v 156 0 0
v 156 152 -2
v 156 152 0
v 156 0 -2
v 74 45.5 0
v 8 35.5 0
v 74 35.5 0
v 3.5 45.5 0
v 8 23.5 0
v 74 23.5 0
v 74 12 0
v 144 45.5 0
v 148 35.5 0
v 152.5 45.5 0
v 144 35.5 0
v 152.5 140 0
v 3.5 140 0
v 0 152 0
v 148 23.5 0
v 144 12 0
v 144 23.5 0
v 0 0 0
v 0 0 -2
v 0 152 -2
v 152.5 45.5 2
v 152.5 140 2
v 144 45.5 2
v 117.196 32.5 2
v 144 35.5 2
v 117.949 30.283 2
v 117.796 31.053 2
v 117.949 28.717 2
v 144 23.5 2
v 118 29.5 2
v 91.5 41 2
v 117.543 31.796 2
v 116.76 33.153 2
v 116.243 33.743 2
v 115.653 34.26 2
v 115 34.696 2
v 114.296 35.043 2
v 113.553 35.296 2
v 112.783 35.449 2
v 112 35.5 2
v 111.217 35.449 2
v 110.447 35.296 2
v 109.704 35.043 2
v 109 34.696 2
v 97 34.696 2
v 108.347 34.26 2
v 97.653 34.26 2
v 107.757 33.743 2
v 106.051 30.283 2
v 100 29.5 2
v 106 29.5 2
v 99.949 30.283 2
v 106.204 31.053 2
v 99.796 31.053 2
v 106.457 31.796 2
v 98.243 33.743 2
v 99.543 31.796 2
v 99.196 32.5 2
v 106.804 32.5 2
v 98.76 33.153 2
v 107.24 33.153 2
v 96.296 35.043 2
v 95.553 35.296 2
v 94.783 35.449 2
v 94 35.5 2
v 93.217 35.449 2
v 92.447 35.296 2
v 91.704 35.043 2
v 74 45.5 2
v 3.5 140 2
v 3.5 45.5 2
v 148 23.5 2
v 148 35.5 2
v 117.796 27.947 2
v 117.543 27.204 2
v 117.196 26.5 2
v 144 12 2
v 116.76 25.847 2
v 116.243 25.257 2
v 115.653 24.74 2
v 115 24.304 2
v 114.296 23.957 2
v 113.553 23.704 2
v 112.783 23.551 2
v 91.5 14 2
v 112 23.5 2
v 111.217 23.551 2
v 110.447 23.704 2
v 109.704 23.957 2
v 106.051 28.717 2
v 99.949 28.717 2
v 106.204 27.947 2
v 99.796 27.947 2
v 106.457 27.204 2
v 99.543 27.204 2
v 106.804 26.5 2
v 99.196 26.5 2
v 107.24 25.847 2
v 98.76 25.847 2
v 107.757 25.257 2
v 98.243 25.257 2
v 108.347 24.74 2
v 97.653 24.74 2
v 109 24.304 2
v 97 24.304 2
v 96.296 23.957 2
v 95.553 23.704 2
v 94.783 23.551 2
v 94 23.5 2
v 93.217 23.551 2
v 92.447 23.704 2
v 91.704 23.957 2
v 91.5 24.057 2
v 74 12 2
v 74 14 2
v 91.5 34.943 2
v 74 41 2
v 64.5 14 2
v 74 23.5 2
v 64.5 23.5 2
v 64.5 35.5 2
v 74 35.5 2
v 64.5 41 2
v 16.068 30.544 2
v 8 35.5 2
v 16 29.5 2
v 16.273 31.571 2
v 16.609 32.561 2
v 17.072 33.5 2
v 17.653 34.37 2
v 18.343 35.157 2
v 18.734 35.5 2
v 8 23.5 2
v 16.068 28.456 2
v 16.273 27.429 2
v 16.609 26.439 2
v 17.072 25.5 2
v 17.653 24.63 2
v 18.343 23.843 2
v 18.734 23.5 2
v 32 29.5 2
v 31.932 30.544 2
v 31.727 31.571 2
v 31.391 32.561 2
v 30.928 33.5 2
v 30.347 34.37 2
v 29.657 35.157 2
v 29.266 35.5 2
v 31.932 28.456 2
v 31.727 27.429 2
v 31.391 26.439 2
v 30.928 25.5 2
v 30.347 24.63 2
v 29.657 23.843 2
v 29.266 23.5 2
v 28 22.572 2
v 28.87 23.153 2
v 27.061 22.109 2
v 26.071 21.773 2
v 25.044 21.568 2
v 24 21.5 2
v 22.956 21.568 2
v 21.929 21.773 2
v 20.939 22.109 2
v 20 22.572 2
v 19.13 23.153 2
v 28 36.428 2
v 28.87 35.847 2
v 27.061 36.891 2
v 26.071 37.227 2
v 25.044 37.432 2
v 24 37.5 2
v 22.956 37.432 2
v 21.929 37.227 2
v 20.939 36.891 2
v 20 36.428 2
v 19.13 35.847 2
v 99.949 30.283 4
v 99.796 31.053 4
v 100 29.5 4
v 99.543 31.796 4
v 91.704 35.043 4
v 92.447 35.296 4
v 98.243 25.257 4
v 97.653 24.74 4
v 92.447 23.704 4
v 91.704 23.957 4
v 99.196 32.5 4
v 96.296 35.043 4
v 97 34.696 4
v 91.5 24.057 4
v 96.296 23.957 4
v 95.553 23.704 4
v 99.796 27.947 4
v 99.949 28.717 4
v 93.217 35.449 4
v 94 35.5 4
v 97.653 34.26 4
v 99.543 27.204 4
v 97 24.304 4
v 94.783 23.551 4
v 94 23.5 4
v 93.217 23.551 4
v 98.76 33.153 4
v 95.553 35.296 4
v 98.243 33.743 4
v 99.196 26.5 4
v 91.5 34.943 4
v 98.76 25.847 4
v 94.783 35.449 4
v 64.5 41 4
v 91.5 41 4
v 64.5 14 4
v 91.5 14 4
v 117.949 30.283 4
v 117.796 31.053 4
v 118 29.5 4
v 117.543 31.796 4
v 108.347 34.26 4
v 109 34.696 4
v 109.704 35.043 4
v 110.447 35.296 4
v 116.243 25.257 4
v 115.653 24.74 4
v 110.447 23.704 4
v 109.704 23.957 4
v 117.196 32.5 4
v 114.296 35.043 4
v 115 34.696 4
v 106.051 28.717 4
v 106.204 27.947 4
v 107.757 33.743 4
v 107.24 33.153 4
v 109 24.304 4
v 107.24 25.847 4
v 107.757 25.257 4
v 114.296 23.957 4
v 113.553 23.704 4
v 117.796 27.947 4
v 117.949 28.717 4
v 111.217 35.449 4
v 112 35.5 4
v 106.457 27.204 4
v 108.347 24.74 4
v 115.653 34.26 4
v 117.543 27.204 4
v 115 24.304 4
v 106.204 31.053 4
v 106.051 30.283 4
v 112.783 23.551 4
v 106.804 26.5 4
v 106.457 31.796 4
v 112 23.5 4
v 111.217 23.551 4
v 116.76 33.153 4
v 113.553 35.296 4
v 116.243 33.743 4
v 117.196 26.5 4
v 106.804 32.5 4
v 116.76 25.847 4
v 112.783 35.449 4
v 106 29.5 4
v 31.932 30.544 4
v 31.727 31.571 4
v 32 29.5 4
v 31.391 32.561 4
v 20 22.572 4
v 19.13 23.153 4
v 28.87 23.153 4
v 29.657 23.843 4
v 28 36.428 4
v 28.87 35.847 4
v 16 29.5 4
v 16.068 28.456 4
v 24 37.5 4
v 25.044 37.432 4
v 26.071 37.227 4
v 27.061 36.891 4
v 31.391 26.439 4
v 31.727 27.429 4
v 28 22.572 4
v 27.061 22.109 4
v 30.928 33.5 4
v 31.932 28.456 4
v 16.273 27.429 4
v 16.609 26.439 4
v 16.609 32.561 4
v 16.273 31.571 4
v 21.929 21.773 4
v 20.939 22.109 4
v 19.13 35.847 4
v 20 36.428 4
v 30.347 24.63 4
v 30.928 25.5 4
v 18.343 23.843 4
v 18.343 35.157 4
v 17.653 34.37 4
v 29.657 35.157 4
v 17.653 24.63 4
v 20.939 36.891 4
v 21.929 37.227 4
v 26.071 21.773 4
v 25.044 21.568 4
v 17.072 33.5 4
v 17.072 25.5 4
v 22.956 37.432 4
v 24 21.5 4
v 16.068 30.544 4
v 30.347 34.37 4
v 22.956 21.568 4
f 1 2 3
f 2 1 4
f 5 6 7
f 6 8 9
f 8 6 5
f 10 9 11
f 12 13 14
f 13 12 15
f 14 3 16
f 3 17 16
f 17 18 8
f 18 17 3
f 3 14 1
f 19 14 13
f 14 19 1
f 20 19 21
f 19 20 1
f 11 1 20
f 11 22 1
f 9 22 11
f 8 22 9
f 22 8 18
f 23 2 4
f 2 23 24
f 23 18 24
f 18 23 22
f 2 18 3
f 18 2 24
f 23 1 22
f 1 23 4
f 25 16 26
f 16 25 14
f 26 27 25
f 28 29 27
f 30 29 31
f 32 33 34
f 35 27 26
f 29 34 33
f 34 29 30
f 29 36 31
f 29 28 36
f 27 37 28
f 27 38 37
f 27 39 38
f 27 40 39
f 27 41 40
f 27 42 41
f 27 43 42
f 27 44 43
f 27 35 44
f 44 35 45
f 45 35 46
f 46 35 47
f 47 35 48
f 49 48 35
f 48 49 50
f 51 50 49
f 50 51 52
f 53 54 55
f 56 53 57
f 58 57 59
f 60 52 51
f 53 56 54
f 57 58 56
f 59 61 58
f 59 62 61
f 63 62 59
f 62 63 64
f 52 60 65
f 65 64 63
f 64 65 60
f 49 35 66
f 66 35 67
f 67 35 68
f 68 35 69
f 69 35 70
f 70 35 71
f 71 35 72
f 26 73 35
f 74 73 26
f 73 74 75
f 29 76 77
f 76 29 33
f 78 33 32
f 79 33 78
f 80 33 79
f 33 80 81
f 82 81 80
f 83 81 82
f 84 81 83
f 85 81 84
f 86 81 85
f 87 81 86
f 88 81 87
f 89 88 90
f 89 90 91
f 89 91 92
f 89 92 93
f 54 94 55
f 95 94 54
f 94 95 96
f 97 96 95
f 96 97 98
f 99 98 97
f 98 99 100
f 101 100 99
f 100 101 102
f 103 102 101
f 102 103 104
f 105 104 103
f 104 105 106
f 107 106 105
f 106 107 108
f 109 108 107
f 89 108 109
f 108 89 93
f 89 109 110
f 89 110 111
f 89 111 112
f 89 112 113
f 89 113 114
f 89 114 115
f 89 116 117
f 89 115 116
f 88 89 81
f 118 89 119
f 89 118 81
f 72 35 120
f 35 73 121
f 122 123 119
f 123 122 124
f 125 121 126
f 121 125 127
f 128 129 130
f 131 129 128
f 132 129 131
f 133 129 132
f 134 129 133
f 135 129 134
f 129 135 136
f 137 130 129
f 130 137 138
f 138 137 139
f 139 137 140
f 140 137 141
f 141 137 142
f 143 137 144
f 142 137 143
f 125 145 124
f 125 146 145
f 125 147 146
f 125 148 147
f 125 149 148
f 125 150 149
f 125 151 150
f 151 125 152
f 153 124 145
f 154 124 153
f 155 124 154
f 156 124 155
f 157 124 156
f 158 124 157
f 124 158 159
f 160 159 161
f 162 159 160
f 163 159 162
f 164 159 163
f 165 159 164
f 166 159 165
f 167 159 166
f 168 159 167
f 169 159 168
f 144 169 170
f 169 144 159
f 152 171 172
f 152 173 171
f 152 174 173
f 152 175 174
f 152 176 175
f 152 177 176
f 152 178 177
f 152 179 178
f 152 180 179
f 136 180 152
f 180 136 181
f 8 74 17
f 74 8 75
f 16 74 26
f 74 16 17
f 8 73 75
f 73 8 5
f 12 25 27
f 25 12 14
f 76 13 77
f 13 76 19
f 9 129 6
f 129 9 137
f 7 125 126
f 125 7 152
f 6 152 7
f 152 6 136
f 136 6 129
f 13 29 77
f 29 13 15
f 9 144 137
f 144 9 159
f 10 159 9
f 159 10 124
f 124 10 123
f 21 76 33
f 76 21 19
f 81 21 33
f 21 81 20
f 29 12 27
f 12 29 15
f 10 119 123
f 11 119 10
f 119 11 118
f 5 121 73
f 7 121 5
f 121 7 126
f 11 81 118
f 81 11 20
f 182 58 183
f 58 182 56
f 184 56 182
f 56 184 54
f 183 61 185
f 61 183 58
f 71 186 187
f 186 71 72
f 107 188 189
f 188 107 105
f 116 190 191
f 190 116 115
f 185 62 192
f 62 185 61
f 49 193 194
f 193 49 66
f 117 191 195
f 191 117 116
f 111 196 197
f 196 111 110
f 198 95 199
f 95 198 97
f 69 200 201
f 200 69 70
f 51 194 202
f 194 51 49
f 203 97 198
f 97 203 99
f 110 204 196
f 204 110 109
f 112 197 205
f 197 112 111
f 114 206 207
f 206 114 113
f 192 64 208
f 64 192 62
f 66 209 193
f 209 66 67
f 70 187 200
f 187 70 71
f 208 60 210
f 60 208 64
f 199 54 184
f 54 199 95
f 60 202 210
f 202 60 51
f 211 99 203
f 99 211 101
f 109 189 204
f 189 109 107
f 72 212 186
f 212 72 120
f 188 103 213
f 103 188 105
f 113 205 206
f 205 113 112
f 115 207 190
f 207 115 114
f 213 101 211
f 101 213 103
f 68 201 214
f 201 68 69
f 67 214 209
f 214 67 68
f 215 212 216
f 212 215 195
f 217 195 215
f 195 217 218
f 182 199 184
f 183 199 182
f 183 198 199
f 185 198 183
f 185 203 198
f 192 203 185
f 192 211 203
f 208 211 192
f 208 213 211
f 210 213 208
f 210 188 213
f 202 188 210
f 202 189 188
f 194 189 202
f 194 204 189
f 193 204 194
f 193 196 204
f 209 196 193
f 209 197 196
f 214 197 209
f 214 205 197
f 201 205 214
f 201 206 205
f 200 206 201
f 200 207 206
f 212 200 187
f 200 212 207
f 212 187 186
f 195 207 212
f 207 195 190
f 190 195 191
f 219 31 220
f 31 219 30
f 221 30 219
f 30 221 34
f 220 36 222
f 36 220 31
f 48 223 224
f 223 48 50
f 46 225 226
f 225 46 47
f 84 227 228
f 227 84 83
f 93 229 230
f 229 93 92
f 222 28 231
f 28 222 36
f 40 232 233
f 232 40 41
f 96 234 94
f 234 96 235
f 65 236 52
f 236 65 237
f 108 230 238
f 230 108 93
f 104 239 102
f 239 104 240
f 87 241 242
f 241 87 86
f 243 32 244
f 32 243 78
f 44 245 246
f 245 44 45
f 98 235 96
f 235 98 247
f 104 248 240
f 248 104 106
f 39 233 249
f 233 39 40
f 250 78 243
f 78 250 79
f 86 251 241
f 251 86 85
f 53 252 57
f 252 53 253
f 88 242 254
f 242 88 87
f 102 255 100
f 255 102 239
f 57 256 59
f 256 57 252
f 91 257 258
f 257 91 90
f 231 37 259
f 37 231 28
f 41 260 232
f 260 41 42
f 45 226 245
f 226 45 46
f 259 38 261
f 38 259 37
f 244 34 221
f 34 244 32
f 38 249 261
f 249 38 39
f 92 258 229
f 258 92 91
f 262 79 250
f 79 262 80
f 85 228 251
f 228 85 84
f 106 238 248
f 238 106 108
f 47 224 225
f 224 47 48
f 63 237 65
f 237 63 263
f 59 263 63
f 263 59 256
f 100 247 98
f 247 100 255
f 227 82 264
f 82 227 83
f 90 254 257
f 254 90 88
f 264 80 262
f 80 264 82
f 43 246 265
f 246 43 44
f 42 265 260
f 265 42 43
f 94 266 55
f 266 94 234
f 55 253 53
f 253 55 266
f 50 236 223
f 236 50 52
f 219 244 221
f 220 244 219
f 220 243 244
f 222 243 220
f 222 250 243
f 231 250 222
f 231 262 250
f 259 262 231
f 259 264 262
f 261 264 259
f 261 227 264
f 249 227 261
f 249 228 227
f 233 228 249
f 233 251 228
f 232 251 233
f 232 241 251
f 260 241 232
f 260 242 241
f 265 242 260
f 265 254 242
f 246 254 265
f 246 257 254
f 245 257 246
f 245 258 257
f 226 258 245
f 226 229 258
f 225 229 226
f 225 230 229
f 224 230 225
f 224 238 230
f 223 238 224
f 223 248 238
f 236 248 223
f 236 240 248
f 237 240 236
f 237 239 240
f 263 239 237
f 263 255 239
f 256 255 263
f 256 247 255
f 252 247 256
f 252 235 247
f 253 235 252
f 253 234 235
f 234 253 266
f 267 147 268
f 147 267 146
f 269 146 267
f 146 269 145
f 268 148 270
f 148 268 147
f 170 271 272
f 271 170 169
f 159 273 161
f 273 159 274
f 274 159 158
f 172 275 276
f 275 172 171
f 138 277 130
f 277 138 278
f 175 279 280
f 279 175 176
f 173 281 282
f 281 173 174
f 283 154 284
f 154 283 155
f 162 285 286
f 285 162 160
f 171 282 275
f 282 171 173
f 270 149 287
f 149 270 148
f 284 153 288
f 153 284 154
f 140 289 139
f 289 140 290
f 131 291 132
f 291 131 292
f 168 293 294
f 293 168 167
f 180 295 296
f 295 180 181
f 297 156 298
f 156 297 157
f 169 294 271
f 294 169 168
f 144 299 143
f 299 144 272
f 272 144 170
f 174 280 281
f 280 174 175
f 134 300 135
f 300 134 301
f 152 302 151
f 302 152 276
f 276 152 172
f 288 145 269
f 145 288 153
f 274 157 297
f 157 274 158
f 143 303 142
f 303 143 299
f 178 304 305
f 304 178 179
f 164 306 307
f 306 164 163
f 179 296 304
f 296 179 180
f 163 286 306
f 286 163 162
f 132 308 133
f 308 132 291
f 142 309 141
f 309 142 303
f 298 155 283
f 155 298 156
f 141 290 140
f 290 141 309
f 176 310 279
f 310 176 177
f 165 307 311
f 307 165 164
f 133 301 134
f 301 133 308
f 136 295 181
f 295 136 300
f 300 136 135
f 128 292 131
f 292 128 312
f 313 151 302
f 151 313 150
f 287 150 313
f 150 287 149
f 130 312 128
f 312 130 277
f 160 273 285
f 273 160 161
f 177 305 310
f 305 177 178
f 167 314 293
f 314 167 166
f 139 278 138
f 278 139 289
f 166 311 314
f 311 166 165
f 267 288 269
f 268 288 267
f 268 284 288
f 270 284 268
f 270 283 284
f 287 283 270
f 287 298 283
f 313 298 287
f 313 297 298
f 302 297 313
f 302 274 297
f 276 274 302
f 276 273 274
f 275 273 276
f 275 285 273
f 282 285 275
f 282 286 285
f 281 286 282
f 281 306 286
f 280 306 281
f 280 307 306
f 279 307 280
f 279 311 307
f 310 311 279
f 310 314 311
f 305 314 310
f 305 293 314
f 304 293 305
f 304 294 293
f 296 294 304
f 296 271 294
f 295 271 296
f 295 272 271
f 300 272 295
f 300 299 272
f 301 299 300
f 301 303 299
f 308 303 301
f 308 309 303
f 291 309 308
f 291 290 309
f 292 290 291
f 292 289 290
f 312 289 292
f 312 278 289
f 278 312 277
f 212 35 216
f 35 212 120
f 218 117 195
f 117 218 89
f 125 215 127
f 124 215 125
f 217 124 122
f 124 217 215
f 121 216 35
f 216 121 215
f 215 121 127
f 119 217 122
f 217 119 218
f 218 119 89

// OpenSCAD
//
// ============================================================================
// SteamMachine UM790
// Project Phoenix
//
// front_layout.scad
//
// Plano de distribución del frontal.
// NO es una pieza imprimible.
//
// ⚠️ OBSOLETO (2026-08-03) — sustituido por:
//   - openscad/reference/front_panel_view.scad (alzado 2D con las
//     posiciones ya validadas y verificadas)
//   - openscad/parts/03_panels/lower_panel.scad y nfc_panel.scad
//     (piezas imprimibles reales)
//
// Las posiciones de este archivo (USB de Ø12 mm a modo de boceto,
// panel NFC de 70 mm de ancho) quedaron desactualizadas tras el
// ensamblaje virtual v1 — ver docs/Virtual_Assembly_Report.md. Se
// conserva sin borrar como referencia histórica.
//
// ============================================================================

include <../../../00_parametros.scad>;

$fn=48;

//============================================================
// DIMENSIONES
//============================================================

panel_w = case_width;
panel_h = case_height;

//============================================================
// PANEL NFC
//============================================================

nfc_w = nfc_panel_width;
nfc_h = nfc_panel_height;

nfc_x = (panel_w-nfc_w)/2;
nfc_y = panel_h-12-nfc_h;

//============================================================
// BARRA LED
//============================================================

led_margin = 8;

led_w = panel_w-led_margin*2;
led_h = led_bar_height;

led_x = led_margin;
led_y = nfc_y-10-led_h;

//============================================================
// MÓDULO USB
//============================================================

usb_module_w = 70;
usb_module_h = 35;

usb_module_x = panel_w-usb_module_w-12;
usb_module_y = 12;

//============================================================
// PULSADOR
//============================================================

button_d = 16;

button_x = 24;
button_y = usb_module_y+usb_module_h/2;

//============================================================
// OLED
//============================================================

oled_size = 27;

oled_x = (panel_w-oled_size)/2;
oled_y = usb_module_y+2;

//============================================================
// PANEL EXTERIOR
//============================================================

color([0.15,0.15,0.15])

translate([0,0,-2])

cube(
[
panel_w,
panel_h,
2
]);

//============================================================
// PANEL NFC
//============================================================

color("RoyalBlue")

translate(
[
nfc_x,
nfc_y,
0
])

cube(
[
nfc_w,
nfc_h,
2
]);

//============================================================
// BARRA LED
//============================================================

color("White")

translate(
[
led_x,
led_y,
0
])

cube(
[
led_w,
led_h,
2
]);

//============================================================
// USB MODULE
//============================================================

color("Orange")

translate(
[
usb_module_x,
usb_module_y,
0
])

cube(
[
usb_module_w,
usb_module_h,
2
]);

//============================================================
// USB VISIBLES
//============================================================

usb_d = 12;
usb_sep = 18;

color("Silver")

translate(
[
usb_module_x+20,
usb_module_y+usb_module_h/2,
2
])

cylinder(
d=usb_d,
h=2
);

translate(
[
usb_module_x+20+usb_sep,
usb_module_y+usb_module_h/2,
2
])

cylinder(
d=usb_d,
h=2
);

//============================================================
// PULSADOR
//============================================================

color("Red")

translate(
[
button_x,
button_y,
2
])

cylinder(
d=button_d,
h=2
);

//============================================================
// OLED
//============================================================

color("DarkSlateGray")

translate(
[
oled_x,
oled_y,
2
])

cube(
[
oled_size,
oled_size,
2
]);

echo("===============");
echo("SteamMachine UM790");
echo("Front Layout V1");
echo("===============");
